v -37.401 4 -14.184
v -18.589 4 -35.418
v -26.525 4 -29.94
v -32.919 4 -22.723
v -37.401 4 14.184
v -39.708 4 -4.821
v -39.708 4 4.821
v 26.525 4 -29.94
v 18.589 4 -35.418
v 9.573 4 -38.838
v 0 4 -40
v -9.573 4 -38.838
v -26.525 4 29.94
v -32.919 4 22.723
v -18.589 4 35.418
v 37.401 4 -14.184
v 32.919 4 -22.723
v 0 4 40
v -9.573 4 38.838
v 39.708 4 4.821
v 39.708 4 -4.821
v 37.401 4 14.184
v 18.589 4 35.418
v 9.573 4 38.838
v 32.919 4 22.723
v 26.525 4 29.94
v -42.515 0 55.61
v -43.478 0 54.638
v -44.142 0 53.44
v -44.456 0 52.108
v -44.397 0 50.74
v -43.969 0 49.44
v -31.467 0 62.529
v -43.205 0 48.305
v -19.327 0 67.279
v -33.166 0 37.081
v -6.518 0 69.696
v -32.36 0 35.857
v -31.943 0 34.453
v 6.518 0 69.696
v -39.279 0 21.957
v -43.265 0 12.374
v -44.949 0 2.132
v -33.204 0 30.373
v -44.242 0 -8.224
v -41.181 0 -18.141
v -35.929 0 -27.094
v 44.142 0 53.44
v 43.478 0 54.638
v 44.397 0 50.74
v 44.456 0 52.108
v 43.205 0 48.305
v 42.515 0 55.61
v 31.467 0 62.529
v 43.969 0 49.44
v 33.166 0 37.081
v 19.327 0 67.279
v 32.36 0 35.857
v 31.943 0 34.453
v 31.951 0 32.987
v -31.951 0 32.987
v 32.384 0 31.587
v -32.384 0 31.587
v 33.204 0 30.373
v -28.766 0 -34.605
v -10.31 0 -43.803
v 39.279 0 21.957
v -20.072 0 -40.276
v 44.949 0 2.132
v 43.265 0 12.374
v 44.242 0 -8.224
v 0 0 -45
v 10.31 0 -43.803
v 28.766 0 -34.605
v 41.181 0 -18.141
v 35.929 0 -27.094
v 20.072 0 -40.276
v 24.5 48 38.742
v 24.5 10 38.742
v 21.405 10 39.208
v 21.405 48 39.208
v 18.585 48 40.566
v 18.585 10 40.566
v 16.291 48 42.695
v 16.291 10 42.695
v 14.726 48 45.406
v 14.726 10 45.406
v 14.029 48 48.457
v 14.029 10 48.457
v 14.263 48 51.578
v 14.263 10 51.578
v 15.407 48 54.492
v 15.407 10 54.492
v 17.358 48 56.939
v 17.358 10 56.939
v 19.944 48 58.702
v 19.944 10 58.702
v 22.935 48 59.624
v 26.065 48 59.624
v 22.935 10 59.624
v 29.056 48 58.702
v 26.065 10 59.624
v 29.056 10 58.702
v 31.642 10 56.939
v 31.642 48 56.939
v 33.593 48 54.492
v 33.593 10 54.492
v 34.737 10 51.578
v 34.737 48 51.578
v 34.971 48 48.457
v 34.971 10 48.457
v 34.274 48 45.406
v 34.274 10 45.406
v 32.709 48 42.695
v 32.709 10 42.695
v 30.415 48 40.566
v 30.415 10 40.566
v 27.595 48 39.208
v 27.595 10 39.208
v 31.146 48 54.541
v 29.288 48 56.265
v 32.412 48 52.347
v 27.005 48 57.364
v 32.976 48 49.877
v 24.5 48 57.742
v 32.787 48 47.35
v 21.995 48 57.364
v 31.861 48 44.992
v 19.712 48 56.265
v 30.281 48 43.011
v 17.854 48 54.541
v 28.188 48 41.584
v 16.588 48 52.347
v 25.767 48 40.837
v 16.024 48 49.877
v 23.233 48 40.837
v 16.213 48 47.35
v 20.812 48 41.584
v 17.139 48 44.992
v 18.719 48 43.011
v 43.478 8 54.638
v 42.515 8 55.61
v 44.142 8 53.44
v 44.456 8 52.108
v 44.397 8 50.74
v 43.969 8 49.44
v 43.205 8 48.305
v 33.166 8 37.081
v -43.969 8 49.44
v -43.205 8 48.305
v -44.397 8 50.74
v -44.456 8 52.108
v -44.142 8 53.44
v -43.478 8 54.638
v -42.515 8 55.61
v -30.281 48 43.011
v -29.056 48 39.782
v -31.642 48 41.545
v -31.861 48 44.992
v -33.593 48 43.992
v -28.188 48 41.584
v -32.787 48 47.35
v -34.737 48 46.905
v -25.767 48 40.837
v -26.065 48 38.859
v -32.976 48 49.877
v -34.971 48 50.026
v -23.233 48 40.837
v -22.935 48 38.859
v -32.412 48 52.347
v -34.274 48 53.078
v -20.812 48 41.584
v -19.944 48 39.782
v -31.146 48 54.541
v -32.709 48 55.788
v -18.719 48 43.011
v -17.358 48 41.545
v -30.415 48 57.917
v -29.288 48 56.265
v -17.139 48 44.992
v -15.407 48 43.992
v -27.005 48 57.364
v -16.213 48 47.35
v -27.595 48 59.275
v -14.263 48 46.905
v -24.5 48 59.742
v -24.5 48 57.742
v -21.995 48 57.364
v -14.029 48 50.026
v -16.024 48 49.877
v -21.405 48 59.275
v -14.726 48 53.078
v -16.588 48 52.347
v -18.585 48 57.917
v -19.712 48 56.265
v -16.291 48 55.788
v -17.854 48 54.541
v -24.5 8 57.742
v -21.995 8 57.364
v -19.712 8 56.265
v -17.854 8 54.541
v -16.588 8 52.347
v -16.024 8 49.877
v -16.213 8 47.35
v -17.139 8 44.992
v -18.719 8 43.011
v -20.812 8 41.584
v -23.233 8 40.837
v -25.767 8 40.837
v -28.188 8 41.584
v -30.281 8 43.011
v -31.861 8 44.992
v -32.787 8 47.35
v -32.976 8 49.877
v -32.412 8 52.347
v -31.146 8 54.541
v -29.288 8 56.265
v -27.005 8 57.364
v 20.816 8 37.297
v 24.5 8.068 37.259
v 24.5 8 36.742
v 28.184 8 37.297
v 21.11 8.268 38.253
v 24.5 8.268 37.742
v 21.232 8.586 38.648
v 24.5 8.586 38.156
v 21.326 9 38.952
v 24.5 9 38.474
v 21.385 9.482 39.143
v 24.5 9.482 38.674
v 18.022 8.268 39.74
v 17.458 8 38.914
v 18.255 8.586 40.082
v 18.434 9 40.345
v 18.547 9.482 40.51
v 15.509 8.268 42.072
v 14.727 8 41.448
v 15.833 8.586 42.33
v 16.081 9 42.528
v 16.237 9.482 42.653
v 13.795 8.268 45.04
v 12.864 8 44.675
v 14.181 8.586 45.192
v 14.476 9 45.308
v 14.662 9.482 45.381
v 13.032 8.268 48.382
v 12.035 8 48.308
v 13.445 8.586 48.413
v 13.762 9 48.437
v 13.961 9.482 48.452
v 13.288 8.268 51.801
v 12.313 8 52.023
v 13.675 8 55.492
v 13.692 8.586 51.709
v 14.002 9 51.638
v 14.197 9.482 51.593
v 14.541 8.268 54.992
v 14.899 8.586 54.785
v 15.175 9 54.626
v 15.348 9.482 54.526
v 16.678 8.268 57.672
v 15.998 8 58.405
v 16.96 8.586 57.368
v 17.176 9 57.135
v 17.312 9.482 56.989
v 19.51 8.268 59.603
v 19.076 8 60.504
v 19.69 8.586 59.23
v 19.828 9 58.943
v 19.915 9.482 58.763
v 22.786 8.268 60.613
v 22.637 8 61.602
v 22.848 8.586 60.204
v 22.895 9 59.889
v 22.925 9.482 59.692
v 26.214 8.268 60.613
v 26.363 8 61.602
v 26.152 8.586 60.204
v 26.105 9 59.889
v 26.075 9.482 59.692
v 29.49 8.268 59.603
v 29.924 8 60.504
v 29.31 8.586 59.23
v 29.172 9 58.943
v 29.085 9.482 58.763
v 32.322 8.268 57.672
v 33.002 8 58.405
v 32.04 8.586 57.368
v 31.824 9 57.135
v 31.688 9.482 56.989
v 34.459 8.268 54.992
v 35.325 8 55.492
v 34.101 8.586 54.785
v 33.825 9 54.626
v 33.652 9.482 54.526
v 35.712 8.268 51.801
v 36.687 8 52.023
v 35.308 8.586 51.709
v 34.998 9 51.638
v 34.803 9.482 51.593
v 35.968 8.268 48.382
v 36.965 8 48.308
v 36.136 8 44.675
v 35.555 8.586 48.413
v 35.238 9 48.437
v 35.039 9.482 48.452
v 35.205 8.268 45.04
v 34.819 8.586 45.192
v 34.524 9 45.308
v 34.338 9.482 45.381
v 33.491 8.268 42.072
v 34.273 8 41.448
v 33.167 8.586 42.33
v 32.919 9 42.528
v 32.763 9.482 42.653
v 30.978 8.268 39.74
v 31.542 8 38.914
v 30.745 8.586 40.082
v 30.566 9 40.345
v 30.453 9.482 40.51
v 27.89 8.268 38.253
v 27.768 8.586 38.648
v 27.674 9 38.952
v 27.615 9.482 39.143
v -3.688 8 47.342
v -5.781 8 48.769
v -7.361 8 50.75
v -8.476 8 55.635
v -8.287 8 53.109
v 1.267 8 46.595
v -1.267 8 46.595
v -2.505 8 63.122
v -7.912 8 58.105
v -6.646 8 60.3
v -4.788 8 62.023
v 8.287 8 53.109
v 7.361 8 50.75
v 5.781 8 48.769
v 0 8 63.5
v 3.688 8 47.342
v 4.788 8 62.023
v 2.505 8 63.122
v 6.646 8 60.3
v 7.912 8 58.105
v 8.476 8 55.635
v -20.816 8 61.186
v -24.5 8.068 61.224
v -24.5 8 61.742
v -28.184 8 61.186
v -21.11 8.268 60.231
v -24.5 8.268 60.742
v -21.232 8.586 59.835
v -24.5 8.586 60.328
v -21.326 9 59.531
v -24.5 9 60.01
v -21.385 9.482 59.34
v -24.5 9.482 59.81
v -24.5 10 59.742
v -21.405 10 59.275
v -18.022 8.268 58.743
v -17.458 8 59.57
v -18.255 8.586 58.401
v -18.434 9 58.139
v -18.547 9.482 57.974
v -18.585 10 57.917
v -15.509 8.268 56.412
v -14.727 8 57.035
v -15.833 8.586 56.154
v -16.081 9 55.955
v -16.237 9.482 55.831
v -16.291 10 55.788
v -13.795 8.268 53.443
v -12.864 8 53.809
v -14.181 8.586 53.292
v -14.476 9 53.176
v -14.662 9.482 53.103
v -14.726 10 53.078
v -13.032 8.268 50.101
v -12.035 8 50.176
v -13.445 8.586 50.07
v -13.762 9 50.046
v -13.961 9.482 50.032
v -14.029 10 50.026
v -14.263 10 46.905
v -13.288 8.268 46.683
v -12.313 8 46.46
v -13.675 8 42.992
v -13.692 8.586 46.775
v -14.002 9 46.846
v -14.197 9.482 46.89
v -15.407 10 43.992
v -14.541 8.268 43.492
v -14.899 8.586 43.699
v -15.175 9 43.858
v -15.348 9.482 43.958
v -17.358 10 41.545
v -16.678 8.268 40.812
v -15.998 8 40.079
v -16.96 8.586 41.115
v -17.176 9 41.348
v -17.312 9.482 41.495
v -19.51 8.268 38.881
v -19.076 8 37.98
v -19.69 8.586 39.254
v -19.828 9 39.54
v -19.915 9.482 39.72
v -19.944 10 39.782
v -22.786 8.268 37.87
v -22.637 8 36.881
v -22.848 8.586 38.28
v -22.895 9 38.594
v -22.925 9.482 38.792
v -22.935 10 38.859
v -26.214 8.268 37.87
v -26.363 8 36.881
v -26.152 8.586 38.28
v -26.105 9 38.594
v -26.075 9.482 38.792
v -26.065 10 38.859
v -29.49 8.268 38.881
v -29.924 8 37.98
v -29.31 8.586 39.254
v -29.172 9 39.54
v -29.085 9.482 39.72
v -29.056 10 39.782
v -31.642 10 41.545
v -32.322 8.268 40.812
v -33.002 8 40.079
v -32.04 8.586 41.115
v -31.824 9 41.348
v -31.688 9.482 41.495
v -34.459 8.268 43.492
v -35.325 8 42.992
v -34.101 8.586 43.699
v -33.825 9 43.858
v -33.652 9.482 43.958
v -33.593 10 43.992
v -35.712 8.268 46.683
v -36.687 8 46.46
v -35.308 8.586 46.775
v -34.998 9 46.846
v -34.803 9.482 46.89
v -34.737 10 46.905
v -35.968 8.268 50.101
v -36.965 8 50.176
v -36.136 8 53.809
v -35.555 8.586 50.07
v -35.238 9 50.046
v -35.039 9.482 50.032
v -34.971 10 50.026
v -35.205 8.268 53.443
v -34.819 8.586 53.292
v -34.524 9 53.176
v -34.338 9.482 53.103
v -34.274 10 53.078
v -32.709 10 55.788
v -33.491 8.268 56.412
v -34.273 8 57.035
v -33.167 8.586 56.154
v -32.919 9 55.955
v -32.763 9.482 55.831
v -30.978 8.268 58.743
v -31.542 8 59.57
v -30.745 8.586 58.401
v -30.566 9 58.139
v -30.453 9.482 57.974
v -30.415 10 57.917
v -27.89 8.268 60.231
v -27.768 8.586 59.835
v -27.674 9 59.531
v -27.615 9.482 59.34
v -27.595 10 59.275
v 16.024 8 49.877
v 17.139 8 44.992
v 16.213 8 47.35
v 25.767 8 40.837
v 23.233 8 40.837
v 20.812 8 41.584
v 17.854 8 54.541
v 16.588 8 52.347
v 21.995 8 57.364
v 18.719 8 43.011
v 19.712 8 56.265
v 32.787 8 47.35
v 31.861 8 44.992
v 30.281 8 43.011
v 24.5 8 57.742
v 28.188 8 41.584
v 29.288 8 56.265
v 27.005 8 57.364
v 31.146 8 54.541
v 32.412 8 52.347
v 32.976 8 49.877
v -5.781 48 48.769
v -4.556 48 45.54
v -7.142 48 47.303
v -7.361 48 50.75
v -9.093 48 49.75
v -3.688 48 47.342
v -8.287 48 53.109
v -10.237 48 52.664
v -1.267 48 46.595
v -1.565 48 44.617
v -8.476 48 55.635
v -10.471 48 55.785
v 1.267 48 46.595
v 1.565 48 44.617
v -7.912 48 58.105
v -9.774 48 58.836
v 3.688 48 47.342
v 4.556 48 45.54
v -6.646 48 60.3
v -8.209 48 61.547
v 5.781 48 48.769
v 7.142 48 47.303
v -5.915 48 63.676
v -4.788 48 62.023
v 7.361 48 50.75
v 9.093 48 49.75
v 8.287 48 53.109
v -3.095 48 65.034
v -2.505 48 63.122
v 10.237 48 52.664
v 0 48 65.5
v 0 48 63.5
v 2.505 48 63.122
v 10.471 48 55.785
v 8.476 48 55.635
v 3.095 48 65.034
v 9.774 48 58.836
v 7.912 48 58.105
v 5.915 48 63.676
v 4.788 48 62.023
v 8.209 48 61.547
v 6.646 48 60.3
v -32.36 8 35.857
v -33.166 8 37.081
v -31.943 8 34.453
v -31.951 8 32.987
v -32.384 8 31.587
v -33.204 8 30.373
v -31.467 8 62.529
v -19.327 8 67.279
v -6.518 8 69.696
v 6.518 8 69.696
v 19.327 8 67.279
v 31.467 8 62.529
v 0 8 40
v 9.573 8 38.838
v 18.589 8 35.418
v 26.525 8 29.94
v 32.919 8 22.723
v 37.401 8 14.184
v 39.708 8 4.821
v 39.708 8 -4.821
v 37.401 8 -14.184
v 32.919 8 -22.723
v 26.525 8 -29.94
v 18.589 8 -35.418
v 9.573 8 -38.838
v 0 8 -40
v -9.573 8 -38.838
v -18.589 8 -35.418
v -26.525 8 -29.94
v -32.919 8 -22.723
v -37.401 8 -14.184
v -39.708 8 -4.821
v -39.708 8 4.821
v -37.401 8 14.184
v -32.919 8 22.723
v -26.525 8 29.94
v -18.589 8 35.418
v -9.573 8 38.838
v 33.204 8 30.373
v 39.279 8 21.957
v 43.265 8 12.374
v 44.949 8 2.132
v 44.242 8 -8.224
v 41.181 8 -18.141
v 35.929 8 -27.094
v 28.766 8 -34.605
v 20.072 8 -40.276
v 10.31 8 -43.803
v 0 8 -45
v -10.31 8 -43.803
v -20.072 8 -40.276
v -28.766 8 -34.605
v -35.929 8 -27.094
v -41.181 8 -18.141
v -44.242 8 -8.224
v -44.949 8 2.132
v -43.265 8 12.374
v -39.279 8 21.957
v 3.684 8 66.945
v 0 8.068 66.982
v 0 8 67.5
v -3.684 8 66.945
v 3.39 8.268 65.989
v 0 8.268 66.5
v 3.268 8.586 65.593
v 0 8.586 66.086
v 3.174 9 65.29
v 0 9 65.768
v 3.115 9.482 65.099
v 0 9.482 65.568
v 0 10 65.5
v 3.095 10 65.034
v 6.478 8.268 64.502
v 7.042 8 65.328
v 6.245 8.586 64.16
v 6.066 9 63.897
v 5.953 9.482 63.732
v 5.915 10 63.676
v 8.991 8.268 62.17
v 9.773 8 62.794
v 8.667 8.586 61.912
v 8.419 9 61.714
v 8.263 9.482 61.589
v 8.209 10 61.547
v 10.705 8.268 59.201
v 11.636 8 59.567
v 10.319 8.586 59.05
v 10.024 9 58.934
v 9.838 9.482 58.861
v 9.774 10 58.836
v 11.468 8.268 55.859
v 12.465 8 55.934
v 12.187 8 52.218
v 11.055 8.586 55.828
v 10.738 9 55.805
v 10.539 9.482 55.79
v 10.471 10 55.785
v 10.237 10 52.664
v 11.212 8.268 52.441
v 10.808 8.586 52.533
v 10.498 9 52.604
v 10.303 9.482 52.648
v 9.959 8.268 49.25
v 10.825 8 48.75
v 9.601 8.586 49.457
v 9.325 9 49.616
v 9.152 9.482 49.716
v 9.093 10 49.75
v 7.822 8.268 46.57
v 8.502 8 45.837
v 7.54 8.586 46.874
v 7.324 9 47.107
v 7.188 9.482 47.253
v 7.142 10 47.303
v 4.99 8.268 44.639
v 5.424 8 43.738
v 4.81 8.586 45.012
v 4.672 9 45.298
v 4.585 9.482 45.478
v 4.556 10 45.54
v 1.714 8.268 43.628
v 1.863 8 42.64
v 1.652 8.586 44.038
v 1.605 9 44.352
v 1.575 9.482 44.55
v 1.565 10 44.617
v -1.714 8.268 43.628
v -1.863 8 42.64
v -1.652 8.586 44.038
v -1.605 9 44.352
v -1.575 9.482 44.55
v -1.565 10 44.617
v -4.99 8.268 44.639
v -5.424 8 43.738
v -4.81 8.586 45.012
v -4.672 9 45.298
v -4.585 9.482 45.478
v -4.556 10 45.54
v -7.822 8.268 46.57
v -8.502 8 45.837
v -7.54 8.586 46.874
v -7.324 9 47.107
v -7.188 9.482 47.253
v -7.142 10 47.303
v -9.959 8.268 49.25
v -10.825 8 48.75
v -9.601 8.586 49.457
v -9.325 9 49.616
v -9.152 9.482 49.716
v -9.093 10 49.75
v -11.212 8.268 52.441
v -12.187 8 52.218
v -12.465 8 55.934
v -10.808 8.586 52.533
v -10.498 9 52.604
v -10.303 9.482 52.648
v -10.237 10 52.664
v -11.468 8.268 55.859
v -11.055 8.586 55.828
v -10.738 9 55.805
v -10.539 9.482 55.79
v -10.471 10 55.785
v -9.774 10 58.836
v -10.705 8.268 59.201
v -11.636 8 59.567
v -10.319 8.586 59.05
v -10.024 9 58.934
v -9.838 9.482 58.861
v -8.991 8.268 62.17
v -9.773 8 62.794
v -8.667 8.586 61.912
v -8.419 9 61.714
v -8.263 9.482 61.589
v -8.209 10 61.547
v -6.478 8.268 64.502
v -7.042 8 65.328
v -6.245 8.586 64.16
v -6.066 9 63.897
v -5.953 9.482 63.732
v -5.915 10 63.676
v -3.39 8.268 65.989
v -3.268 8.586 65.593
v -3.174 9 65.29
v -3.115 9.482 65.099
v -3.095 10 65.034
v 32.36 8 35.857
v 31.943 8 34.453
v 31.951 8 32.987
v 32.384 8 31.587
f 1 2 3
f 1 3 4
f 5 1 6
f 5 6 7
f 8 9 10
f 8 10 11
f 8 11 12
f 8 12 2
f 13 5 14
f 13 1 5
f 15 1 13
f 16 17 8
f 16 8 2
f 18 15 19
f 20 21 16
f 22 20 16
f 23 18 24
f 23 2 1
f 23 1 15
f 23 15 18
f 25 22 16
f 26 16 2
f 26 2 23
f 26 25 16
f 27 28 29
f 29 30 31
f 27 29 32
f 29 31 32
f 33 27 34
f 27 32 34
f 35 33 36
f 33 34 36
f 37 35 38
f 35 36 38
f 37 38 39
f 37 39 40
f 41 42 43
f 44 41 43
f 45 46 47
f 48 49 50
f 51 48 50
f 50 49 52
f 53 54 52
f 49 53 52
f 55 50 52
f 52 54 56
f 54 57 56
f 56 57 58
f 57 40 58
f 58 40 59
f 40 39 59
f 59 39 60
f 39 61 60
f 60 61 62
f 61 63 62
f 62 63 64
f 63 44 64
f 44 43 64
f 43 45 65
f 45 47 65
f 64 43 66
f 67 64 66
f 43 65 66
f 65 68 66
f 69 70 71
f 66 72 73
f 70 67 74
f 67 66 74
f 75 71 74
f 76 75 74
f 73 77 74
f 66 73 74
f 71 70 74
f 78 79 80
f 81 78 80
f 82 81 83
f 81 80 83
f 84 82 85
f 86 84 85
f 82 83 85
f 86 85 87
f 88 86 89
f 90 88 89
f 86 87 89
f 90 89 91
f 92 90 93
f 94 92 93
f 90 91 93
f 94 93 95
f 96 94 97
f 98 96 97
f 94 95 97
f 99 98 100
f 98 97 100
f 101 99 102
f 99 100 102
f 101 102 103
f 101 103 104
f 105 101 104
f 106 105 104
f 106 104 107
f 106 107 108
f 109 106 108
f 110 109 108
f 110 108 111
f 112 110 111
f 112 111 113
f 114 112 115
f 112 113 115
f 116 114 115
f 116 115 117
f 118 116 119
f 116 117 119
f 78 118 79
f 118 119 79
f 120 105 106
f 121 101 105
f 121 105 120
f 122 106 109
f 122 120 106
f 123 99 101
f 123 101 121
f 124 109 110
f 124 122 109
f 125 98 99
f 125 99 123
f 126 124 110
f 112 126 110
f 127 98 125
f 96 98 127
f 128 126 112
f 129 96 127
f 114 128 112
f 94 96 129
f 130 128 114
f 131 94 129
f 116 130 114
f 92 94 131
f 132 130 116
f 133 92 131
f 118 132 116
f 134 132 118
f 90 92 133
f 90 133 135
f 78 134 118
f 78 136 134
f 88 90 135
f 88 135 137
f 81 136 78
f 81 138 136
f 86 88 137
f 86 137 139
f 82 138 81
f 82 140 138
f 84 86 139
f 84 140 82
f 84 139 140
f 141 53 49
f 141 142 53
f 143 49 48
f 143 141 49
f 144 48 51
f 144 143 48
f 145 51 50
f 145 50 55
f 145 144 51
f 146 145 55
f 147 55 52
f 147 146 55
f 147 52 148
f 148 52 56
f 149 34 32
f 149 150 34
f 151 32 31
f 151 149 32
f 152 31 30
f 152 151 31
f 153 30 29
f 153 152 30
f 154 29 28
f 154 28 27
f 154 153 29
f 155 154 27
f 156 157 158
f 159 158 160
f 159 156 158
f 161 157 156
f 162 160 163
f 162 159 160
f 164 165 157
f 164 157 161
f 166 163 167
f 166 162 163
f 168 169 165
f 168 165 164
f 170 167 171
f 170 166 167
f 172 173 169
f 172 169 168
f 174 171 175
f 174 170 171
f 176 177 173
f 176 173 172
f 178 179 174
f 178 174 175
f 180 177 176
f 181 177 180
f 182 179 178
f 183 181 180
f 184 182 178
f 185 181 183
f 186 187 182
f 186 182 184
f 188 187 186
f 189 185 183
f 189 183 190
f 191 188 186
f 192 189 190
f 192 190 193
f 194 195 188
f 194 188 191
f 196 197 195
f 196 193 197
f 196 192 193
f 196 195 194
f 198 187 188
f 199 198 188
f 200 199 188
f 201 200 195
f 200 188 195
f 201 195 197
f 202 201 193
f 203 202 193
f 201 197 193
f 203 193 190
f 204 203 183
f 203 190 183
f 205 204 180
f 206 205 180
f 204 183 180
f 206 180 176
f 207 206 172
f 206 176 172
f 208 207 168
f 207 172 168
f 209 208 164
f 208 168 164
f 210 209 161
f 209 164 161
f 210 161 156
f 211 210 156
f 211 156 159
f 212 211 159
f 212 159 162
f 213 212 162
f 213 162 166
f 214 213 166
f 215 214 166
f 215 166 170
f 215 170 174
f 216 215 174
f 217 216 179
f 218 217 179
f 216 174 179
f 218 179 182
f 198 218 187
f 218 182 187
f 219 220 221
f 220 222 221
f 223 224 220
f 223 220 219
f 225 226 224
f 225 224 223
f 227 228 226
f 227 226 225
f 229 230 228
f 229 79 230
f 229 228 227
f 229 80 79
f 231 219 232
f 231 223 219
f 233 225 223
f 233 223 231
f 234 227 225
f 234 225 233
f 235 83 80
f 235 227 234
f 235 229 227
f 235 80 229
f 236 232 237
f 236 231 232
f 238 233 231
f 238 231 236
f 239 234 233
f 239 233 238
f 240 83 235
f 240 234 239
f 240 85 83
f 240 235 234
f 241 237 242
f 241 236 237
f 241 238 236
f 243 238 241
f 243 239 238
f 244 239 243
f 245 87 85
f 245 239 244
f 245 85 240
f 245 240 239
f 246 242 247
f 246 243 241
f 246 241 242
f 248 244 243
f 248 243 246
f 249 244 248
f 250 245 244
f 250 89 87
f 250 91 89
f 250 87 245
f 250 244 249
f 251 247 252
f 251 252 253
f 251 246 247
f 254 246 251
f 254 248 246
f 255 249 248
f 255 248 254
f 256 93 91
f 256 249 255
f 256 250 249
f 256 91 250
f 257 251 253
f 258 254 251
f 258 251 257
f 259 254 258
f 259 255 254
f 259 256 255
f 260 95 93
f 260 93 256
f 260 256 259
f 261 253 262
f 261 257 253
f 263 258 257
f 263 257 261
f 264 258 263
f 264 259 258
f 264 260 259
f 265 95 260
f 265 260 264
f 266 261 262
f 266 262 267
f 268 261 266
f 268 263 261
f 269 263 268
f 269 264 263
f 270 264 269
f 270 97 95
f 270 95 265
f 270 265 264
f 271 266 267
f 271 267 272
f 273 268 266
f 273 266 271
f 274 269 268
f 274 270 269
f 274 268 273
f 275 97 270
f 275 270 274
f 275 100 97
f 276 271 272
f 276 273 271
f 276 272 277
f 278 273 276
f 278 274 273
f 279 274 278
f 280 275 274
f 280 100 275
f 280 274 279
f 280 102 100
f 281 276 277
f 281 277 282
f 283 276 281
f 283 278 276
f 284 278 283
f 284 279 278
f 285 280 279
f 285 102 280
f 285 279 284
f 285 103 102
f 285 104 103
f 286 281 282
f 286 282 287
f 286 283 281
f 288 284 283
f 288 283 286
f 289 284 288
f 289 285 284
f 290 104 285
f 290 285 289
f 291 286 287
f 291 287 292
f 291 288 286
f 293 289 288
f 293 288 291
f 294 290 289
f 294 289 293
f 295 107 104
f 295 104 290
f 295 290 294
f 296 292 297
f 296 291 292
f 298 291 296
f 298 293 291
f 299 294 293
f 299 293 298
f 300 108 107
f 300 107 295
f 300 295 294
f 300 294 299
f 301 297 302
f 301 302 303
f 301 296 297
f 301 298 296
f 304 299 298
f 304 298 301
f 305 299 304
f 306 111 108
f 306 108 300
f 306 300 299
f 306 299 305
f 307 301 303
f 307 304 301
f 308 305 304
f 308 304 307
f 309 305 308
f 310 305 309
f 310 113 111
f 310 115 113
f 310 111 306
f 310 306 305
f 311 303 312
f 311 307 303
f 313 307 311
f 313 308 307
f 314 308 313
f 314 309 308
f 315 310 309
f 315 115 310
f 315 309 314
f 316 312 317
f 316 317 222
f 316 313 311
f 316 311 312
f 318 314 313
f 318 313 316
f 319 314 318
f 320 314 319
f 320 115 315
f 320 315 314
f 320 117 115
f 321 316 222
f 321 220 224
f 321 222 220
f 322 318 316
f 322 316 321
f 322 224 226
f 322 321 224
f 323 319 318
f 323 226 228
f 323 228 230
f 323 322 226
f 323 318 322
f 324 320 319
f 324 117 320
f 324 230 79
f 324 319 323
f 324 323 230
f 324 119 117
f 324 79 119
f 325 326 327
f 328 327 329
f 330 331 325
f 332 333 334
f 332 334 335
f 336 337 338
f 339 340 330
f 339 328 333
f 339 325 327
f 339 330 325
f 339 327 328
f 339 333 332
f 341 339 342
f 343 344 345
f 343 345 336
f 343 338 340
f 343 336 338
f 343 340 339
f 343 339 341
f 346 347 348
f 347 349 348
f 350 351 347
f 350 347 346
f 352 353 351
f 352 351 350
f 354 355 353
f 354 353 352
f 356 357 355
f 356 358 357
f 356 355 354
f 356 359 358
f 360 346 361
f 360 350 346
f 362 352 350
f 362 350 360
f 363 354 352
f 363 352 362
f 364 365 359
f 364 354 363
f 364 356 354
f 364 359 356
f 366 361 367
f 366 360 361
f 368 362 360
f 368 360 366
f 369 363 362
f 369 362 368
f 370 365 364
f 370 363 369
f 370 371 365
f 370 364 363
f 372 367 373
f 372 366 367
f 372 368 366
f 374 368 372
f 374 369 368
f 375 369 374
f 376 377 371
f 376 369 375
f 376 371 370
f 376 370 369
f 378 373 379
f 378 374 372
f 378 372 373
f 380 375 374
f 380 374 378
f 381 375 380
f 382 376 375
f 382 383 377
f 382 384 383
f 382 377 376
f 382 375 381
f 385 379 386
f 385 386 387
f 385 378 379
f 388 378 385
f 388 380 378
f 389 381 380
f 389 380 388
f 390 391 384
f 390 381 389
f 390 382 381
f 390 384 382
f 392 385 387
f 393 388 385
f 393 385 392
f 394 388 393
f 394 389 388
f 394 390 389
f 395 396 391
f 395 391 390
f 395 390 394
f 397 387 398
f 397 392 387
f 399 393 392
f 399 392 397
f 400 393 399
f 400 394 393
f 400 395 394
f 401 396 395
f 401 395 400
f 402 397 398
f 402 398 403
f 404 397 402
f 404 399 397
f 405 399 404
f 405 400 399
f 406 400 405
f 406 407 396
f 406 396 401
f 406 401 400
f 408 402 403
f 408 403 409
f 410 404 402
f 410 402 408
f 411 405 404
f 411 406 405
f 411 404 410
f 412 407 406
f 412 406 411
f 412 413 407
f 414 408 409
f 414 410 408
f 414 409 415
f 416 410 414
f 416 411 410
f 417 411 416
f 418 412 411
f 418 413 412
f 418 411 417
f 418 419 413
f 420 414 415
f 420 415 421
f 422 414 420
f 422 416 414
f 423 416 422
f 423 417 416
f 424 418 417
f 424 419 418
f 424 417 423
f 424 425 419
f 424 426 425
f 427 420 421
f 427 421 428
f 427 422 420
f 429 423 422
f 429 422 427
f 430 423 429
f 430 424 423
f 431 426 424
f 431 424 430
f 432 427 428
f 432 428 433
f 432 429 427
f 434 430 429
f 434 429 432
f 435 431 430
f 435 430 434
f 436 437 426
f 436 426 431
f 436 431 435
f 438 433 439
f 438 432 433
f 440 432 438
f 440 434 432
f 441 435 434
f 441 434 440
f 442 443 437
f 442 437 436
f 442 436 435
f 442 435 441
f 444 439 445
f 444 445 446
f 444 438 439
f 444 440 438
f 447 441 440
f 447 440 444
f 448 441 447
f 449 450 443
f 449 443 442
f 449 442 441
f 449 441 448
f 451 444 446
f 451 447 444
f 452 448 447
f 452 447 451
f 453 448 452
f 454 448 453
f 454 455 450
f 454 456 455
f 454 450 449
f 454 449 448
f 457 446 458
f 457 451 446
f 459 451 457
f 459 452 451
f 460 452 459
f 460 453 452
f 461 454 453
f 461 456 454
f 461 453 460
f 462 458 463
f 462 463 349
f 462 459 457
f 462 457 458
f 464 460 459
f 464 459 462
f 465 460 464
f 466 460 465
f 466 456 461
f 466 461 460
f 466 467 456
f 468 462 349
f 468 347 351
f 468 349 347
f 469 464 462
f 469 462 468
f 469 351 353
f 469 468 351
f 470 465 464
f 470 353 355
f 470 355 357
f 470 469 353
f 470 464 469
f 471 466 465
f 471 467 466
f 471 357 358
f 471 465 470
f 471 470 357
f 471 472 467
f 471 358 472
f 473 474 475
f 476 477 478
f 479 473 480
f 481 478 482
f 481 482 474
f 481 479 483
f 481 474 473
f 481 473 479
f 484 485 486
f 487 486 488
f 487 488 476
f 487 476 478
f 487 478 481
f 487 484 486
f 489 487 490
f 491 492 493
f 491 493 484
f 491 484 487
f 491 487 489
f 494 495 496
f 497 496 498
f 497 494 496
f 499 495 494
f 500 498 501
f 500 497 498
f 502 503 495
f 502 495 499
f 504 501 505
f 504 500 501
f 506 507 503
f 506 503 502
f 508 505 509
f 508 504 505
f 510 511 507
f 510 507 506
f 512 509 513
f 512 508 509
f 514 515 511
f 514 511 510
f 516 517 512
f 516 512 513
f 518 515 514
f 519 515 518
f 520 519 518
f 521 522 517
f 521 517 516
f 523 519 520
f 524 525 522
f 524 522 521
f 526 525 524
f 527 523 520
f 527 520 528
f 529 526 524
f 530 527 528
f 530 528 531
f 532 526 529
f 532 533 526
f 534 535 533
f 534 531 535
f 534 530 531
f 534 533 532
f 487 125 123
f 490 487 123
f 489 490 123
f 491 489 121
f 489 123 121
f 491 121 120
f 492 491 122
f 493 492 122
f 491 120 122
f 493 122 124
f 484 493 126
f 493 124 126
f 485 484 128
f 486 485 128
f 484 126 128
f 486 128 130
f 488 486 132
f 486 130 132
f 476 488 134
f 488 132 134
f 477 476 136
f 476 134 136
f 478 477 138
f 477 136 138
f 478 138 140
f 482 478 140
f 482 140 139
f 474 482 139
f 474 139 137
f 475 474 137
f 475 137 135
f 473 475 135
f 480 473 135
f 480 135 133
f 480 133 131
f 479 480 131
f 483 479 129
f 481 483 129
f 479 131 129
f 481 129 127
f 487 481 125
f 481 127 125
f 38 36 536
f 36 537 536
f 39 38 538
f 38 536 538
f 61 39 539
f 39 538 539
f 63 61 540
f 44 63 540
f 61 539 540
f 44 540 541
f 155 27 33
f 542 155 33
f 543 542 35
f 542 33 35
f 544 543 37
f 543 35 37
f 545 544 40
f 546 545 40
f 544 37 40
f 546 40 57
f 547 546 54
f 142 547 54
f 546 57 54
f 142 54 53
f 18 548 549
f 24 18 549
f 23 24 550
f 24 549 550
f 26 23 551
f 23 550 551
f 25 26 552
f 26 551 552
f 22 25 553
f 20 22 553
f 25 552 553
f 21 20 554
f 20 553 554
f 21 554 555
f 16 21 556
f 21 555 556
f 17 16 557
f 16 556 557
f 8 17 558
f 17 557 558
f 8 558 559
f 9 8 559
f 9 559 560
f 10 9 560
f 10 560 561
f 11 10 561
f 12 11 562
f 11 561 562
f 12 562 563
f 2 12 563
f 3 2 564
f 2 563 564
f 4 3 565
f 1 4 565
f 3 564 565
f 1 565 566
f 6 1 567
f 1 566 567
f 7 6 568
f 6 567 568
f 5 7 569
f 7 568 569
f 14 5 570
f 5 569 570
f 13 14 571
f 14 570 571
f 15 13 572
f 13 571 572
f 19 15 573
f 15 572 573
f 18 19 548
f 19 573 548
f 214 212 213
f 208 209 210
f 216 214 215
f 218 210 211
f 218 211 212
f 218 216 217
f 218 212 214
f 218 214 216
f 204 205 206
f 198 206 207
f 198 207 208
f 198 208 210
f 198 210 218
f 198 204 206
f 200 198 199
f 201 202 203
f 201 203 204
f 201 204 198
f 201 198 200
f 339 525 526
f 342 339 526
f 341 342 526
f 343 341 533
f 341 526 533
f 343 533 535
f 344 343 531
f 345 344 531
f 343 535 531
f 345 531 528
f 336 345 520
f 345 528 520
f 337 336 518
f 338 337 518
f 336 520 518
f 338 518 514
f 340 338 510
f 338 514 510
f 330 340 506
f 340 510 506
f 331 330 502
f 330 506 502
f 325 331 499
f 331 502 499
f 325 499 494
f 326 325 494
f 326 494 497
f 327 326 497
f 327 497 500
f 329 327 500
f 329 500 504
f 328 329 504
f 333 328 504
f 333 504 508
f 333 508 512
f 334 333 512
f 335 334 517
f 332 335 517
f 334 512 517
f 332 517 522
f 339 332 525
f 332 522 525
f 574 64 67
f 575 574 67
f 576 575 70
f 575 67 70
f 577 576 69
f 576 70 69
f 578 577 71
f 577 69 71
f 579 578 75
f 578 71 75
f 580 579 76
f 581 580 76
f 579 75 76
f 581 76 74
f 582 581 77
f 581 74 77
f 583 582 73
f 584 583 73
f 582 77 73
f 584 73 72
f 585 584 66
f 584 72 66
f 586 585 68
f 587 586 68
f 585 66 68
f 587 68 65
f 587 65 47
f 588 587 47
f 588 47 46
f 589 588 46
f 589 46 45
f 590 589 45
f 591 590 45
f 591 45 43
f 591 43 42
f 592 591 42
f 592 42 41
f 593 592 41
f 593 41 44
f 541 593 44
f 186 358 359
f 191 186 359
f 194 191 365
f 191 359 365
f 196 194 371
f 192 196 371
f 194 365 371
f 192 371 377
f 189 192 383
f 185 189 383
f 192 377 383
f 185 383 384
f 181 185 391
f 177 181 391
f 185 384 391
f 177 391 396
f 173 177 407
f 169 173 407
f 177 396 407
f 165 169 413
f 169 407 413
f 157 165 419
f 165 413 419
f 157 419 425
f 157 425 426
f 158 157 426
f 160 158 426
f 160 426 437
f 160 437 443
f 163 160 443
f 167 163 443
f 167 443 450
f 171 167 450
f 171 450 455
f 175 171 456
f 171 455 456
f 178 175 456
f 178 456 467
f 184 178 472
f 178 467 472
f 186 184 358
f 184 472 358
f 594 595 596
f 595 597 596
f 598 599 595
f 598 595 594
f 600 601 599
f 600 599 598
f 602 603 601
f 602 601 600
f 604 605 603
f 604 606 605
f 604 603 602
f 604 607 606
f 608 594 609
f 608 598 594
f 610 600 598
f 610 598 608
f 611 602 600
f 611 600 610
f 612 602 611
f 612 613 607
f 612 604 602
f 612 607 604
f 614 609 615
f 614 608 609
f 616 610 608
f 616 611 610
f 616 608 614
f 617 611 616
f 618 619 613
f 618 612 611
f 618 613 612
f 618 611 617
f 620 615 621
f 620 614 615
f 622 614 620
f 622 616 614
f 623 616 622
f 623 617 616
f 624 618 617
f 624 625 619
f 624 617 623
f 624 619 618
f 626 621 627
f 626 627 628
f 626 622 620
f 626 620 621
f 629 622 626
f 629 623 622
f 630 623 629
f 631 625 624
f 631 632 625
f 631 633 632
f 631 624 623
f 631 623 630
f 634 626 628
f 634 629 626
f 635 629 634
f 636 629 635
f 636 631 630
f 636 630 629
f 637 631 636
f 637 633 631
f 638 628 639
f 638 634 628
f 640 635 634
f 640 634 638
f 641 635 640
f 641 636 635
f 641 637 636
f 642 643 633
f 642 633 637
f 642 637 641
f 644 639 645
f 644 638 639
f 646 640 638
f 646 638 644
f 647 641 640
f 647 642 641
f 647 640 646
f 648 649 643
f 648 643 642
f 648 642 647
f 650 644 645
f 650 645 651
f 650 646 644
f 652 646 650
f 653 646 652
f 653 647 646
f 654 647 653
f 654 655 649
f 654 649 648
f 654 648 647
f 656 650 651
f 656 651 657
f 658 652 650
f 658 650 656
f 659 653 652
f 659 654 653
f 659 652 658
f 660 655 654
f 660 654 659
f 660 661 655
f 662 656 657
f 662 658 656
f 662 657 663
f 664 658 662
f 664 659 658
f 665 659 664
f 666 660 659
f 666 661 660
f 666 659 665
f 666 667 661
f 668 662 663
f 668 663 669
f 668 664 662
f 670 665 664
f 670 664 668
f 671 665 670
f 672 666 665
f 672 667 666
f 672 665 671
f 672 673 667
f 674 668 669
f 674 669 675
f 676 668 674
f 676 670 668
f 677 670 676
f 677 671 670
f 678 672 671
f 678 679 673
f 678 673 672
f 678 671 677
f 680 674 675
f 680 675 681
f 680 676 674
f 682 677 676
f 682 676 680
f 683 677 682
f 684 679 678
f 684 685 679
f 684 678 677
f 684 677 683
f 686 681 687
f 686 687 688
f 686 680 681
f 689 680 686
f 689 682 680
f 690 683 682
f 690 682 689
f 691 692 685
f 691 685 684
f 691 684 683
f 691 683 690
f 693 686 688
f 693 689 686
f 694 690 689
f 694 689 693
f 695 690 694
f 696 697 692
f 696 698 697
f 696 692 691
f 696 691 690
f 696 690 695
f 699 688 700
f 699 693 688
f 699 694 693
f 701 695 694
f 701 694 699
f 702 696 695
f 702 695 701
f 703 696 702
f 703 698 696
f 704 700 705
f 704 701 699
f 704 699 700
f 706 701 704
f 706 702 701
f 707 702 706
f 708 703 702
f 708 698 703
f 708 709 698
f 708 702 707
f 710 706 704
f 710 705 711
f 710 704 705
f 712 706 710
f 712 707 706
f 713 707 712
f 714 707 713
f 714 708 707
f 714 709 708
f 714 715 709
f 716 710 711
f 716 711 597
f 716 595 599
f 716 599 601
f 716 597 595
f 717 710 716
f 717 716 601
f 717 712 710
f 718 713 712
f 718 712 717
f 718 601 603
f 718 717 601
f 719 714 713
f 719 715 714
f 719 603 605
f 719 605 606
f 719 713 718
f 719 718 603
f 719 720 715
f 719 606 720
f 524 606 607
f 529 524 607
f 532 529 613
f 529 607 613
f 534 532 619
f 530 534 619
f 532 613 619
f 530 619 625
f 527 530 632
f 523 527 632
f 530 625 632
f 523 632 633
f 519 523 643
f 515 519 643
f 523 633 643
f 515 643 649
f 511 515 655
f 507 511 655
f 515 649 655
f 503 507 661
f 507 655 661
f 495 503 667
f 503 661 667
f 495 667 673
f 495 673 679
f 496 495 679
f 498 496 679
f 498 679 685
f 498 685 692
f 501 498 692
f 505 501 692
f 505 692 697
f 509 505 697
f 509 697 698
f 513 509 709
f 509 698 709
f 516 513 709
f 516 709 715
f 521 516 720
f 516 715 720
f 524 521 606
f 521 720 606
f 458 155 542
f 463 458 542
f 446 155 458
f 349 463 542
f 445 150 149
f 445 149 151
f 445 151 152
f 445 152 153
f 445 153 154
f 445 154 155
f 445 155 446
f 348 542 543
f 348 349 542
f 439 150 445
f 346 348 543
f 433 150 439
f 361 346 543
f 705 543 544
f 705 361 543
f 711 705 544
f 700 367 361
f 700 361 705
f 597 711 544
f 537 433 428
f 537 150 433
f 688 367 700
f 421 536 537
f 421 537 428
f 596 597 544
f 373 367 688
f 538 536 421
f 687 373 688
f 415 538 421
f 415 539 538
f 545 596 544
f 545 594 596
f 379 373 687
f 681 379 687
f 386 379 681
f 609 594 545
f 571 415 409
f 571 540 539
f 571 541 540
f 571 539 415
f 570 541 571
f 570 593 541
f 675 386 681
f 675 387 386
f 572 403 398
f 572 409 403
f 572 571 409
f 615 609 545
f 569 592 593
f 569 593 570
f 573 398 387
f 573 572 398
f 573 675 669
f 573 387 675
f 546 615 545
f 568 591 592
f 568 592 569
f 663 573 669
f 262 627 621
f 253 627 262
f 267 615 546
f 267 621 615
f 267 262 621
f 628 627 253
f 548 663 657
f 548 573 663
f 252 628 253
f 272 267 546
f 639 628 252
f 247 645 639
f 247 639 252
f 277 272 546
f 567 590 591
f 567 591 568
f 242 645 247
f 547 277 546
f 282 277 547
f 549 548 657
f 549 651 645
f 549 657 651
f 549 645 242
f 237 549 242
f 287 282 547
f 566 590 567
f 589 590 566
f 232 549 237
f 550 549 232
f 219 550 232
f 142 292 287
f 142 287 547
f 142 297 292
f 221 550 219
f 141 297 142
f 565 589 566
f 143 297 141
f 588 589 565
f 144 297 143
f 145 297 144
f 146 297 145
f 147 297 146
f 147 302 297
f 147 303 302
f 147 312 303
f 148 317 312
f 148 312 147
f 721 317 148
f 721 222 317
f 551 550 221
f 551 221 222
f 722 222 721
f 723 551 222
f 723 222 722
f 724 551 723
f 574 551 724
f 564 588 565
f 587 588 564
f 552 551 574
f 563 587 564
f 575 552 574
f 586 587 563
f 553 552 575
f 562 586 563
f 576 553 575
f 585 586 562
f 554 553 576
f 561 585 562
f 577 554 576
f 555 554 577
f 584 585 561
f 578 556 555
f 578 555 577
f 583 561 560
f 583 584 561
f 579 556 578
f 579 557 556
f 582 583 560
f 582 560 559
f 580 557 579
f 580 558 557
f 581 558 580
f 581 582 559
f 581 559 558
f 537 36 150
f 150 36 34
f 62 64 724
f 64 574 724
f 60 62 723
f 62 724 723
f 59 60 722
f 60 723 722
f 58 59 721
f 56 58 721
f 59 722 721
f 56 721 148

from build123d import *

# Parameters (mm, degrees)
BOSS_EXTRU_1_DEPTH      = 8
ESQUISSE2_R             = 40
ENL_V_MAT_EXTRU_1_DEPTH = 4
ESQUISSE4_R             = 10.5
BOSS_EXTRU_2_DEPTH      = 40
ESQUISSE5_R             = 8.5
ENL_V_MAT_EXTRU_2_DEPTH = 40
CONG_1_R                = 5
CONG_4_R                = 2


with BuildPart() as part:
    # Esquisse1 → Boss.-Extru.1 (new body)
    with BuildSketch(Plane(origin=(0, 0, 0), x_dir=(1, 0, 0), z_dir=(0, 1, 0))):
        with BuildLine():
            Line((-30, -33.541019662), (-46.666666667, -52.174919475))
            ThreePointArc((-46.666666667, -52.174919475), (0, -70), (46.666666667, -52.174919475))
            Line((46.666666667, -52.174919475), (30, -33.541019662))
            ThreePointArc((30, -33.541019662), (0, 45), (-30, -33.541019662))
        make_face()
    extrude(amount=BOSS_EXTRU_1_DEPTH)

    # Esquisse2 → Enlèv. mat.-Extru.1 (cut)
    with BuildSketch(Plane(origin=(0, 8, 0), x_dir=(1, 0, 0), z_dir=(0, 1, 0))):
        with Locations(Location((0, 0, 0), (0, 0, 270))):
            Circle(ESQUISSE2_R)
    extrude(amount=-ENL_V_MAT_EXTRU_1_DEPTH, mode=Mode.SUBTRACT)

    # Esquisse4 → Boss.-Extru.2 (add)
    with BuildSketch(Plane(origin=(0, 8, 0), x_dir=(1, 0, 0), z_dir=(0, 1, 0))):
        with Locations(Location((0, -55, 0), (0, 0, 270))):
            Circle(ESQUISSE4_R)
        with Locations(Location((-24.5, -49.241750578, 0), (0, 0, 270))):
            Circle(ESQUISSE4_R)
        with Locations(Location((24.5, -49.241750578, 0), (0, 0, 90))):
            Circle(ESQUISSE4_R)
    extrude(amount=BOSS_EXTRU_2_DEPTH)

    # Esquisse5 → Enlèv. mat.-Extru.2 (cut)
    with BuildSketch(Plane(origin=(0, 48, 0), x_dir=(1, 0, 0), z_dir=(0, 1, 0))):
        with Locations(Location((0, -55, 0), (0, 0, 270))):
            Circle(ESQUISSE5_R)
        with Locations(Location((-24.5, -49.241750578, 0), (0, 0, 270))):
            Circle(ESQUISSE5_R)
        with Locations(Location((24.5, -49.241750578, 0), (0, 0, 270))):
            Circle(ESQUISSE5_R)
    extrude(amount=-ENL_V_MAT_EXTRU_2_DEPTH, mode=Mode.SUBTRACT)

    # Congé1
    cong_1_edges = [part.edges().sort_by_distance(p)[0] for p in [
        (30, 4, 33.541019662),
        (46.666666667, 4, 52.174919475),
        (-46.666666667, 4, 52.174919475),
        (-30, 4, 33.541019662),
    ]]
    fillet(cong_1_edges, radius=CONG_1_R)

    # Congé4
    cong_4_edges = [part.edges().sort_by_distance(p)[0] for p in [
        (0, 8, 44.5),
        (-24.5, 8, 38.741750578),
        (24.5, 8, 59.741750578),
    ]]
    fillet(cong_4_edges, radius=CONG_4_R)


solid = part.part
